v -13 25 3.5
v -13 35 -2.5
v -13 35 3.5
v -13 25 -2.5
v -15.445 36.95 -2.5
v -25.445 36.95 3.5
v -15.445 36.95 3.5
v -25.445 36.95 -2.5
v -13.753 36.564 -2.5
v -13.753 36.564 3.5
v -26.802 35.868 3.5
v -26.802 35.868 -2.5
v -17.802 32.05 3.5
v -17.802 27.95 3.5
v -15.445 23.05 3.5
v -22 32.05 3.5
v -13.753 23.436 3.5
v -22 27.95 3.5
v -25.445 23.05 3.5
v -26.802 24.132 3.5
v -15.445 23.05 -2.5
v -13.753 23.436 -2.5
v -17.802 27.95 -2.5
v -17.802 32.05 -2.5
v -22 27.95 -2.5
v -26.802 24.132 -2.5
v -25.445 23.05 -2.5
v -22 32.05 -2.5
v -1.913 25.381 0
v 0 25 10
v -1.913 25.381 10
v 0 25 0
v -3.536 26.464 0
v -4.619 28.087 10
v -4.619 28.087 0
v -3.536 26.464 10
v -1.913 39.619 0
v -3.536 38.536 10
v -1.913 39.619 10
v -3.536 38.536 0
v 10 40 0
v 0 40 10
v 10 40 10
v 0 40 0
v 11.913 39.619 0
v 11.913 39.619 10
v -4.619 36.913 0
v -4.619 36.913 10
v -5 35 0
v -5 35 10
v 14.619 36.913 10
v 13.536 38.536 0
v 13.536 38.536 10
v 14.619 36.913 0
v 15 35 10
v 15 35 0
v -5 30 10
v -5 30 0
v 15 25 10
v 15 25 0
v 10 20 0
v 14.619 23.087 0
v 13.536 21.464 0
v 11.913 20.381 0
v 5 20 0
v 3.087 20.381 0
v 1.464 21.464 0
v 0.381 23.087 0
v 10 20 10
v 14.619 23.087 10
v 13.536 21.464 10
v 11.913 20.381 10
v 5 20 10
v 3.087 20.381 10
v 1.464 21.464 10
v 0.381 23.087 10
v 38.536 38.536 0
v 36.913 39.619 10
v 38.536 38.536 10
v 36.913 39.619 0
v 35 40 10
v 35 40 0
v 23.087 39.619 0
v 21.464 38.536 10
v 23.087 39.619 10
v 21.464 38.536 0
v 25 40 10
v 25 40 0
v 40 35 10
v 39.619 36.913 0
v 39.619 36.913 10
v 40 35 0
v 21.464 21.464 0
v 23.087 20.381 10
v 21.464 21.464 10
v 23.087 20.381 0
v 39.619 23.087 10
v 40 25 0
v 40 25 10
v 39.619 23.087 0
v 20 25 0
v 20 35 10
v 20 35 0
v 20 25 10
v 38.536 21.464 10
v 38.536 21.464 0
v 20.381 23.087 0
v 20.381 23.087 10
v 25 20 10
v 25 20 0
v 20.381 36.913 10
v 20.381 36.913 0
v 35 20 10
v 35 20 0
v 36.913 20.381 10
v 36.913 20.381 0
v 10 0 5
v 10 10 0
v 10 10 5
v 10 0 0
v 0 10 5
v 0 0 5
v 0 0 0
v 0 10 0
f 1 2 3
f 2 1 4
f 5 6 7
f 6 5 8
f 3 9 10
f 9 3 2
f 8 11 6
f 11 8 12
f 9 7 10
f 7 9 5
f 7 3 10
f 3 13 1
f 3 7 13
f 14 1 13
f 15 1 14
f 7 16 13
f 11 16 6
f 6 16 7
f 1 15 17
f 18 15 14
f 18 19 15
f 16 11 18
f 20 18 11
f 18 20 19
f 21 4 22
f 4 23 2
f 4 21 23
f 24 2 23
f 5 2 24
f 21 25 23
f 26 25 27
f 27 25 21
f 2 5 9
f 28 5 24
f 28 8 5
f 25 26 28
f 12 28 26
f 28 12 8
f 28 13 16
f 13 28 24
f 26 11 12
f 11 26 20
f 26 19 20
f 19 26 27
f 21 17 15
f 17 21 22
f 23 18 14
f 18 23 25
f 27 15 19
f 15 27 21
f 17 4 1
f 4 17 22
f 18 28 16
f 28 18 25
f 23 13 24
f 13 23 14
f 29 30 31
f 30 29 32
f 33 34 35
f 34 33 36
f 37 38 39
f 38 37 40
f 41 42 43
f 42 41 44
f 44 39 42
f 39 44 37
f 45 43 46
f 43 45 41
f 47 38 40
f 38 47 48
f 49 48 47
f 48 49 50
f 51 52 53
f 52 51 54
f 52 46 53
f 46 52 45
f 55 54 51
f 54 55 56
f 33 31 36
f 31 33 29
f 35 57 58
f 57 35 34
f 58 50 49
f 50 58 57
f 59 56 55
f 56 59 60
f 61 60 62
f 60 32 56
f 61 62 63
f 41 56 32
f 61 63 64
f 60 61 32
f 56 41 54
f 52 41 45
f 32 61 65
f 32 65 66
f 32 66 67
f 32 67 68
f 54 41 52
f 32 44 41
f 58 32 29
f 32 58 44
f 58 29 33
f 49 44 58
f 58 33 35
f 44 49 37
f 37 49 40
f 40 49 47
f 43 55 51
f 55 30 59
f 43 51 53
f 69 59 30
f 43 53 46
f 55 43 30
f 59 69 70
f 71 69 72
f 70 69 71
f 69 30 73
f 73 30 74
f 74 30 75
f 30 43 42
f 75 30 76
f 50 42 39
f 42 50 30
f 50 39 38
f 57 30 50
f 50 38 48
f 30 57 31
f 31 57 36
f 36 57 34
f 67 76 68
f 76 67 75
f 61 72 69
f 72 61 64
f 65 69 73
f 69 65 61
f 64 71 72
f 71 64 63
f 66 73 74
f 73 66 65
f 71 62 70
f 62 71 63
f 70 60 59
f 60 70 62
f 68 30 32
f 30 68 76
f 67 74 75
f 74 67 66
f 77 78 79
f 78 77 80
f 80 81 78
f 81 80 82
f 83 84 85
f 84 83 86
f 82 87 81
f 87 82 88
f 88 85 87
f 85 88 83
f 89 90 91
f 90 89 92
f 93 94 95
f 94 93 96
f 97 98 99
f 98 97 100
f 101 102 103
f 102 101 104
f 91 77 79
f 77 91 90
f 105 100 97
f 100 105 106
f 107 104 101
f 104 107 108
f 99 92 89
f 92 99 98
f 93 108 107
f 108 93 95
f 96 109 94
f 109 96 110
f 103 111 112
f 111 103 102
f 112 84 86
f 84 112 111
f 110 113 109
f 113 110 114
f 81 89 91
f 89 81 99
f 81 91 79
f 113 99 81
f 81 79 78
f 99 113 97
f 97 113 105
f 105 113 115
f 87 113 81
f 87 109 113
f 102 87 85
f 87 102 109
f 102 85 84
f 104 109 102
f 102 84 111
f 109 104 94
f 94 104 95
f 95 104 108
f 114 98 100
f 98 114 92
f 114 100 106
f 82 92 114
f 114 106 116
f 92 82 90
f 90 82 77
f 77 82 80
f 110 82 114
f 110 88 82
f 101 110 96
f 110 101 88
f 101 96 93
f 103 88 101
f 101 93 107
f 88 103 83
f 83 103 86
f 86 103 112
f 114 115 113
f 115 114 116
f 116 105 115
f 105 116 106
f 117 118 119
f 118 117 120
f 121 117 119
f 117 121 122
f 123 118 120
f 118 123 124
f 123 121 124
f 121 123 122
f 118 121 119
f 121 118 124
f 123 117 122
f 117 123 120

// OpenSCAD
// Volume: 8746.568560005739, SurfaceArea: 4000.710631816897
module roundedBox3dSimple() {
    minkowski() {
        cube([10,10,5]);
        cylinder(r=5, h=5);
    }
}

module roundedBox3dCut() {
    minkowski() {
        difference() {
            cube([10,10,5]);
            cube([5,5,5]);
        }
        cylinder(r=5, h=5);
    }
}

module roundedBox3dHole() {
    minkowski() {
        difference() {
            cube([10,10,5], center=true);
            cube([8,8,10], center=true);
        }
        cylinder(r=2);
    }
}

translate([-20,30,0]) roundedBox3dHole();
translate([0,25,0]) roundedBox3dCut();
translate([25,25,0]) roundedBox3dSimple();

// One child
translate([0,0,0]) minkowski() { cube([10,10,5]); }

// Empty
minkowski();
// No children
minkowski() { }
